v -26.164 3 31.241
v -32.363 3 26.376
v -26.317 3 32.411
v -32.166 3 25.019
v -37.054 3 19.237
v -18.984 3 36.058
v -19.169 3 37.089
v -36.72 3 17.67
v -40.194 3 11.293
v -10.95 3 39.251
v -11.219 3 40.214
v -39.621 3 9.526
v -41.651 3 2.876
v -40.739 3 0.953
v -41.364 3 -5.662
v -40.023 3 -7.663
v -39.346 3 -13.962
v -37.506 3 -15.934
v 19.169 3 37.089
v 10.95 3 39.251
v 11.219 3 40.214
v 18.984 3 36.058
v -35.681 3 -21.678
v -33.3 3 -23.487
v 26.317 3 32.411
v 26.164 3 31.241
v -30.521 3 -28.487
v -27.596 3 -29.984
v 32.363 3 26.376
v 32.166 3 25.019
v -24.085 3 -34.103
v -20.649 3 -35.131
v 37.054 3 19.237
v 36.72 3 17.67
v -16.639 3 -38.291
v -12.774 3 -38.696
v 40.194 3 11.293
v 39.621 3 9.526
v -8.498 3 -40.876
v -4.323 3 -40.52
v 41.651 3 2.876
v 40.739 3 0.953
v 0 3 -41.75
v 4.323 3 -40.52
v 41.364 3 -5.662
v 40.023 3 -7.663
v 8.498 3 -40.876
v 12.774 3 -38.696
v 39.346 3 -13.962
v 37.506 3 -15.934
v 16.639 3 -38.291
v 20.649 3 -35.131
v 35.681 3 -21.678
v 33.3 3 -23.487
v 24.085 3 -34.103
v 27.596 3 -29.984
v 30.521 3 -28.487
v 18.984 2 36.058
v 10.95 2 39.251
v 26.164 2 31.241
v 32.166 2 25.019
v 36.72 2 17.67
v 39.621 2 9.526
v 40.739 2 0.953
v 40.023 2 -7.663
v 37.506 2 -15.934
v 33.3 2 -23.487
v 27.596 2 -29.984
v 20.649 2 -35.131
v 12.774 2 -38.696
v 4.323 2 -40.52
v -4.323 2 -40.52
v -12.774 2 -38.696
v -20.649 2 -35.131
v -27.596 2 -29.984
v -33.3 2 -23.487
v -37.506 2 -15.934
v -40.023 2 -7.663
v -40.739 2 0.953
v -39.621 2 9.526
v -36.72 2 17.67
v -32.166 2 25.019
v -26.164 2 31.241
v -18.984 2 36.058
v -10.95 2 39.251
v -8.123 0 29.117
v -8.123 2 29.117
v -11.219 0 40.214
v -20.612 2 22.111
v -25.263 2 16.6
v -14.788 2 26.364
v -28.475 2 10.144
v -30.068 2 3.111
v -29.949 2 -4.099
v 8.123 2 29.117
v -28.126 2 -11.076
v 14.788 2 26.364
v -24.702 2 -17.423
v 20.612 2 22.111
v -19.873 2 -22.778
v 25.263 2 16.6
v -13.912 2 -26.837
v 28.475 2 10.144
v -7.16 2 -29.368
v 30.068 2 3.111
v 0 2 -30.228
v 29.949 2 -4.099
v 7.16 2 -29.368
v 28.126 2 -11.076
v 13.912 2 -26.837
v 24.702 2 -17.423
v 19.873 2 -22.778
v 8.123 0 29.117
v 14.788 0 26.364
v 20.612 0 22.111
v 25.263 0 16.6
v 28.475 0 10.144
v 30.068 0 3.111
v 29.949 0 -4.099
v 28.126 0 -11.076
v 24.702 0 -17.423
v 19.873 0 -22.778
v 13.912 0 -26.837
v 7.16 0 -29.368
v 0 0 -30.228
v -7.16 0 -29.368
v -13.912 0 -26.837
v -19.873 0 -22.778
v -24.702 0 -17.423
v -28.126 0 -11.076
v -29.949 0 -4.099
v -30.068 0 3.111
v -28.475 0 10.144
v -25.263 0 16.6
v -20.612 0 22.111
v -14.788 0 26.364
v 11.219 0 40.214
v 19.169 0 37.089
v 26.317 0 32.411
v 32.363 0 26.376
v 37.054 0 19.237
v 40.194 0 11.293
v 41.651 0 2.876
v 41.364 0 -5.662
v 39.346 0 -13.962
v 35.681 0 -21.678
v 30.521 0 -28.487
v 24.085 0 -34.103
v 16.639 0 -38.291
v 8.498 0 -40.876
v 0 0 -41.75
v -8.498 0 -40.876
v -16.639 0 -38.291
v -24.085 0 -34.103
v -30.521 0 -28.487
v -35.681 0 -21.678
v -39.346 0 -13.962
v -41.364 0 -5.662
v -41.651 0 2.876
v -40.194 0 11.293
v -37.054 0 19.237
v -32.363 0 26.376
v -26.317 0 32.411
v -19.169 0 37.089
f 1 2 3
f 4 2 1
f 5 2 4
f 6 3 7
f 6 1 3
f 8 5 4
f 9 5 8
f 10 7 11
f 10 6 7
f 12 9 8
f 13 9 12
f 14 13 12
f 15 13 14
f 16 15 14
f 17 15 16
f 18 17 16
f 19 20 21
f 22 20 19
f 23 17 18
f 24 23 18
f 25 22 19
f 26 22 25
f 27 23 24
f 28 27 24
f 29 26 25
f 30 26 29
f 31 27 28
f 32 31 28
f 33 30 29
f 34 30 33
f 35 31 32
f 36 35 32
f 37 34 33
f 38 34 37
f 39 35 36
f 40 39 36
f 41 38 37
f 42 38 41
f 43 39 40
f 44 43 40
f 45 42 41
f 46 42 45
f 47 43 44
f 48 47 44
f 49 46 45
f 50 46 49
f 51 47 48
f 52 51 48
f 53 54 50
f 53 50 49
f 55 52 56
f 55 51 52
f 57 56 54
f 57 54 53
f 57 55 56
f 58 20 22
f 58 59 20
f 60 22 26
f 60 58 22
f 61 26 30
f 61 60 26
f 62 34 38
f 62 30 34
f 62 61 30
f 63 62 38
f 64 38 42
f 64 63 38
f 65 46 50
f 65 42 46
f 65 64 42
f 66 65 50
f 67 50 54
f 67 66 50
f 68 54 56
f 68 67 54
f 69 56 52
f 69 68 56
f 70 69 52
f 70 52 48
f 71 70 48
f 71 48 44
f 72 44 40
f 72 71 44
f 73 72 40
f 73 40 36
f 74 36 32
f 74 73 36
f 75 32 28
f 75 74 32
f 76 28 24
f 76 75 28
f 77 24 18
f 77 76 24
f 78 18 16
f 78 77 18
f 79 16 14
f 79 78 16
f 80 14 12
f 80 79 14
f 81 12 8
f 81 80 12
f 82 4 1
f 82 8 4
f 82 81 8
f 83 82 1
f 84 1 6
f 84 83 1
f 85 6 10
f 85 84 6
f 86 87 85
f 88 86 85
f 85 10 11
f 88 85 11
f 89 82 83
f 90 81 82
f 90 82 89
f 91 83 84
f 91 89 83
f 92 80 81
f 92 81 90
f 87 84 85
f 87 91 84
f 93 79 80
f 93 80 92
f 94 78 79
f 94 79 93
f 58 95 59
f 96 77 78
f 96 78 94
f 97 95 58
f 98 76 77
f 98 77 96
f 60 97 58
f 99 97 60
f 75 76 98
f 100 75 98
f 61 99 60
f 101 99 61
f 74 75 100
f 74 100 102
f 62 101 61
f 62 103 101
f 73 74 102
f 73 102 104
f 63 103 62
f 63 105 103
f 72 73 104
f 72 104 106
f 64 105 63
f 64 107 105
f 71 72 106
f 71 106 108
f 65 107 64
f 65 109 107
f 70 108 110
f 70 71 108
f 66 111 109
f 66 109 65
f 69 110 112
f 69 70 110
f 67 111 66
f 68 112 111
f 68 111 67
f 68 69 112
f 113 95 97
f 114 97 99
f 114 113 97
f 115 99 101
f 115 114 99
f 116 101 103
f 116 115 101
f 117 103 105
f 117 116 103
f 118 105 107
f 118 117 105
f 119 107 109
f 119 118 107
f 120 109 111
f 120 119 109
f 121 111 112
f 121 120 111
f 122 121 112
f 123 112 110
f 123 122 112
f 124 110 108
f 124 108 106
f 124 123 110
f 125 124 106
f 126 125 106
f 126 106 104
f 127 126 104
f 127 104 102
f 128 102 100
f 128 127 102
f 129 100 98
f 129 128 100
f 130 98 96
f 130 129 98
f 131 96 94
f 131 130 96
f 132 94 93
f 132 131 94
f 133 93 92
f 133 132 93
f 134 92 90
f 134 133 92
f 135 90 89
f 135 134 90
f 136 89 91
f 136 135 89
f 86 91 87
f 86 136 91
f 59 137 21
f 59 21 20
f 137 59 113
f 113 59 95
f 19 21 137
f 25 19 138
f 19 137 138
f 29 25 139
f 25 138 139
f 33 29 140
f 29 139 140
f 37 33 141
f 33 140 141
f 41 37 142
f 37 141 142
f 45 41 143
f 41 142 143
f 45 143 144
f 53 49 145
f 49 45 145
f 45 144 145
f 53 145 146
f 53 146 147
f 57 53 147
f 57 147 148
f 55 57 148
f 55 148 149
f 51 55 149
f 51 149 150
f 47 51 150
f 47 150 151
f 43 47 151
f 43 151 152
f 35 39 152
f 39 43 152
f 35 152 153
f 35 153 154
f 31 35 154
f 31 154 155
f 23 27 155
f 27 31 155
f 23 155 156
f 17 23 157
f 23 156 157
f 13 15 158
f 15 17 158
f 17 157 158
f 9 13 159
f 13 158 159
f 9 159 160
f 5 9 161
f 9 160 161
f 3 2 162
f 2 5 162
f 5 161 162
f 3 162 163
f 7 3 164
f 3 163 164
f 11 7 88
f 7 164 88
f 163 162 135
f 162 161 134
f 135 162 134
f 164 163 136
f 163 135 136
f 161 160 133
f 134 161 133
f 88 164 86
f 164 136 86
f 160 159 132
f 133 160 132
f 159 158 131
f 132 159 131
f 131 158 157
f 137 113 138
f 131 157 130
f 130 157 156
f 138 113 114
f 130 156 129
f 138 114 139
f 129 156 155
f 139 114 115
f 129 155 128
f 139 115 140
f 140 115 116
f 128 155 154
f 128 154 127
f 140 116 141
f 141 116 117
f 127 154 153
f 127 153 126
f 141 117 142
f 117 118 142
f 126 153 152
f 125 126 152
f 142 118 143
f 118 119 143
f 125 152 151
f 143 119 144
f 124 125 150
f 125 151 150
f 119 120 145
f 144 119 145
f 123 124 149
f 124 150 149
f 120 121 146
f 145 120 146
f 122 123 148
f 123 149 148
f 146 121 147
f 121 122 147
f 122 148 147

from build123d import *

# Parameters (mm, degrees)
ESBO_O1_R                  = 41.75
ESBO_O1_R_2                = 30.228395062
RESSALTO_EXTRUS_O1_DEPTH   = 2
ESBO_O3_R                  = 41.75
ESBO_O3_R_2                = 40.75
RESSALTO_EXTRUS_O2_DEPTH   = 1
CORTE_EXTRUS_O1_DEPTH      = 2
CORTE_EXTRUS_O1_DEPTH_BACK = 3


with BuildPart() as part:
    # Esboço1 → Ressalto-extrusão1 (new body)
    with BuildSketch(Plane(origin=(0, 0, 0), x_dir=(1, 0, 0), z_dir=(0, 1, 0))):
        Circle(ESBO_O1_R)
        Circle(ESBO_O1_R_2, mode=Mode.SUBTRACT)
    extrude(amount=RESSALTO_EXTRUS_O1_DEPTH)

    # Esboço3 → Ressalto-extrusão2 (add)
    with BuildSketch(Plane(origin=(0, 2, 0), x_dir=(1, 0, 0), z_dir=(0, 1, 0))):
        Circle(ESBO_O3_R)
        Circle(ESBO_O3_R_2, mode=Mode.SUBTRACT)
    extrude(amount=RESSALTO_EXTRUS_O2_DEPTH)

    # Esboço2 → Corte-extrusão1 (cut, two sides)
    with BuildSketch(Plane(origin=(0, 2, 0), x_dir=(1, 0, 0), z_dir=(0, 1, 0))) as corte_extrus_o1_sk:
        with BuildLine():
            Line((12.293139319, -44.064007213), (7.927300358, -28.414924055))
            ThreePointArc((7.927300358, -28.414924055), (0, -29.5), (-7.927300358, -28.414924055))
            Line((-7.927300358, -28.414924055), (-12.293139319, -44.064007213))
            ThreePointArc((-12.293139319, -44.064007213), (0, -45.746672076), (12.293139319, -44.064007213))
        make_face()
    extrude(amount=CORTE_EXTRUS_O1_DEPTH, mode=Mode.SUBTRACT)
    extrude(corte_extrus_o1_sk.sketch, amount=-CORTE_EXTRUS_O1_DEPTH_BACK, mode=Mode.SUBTRACT)


solid = part.part
